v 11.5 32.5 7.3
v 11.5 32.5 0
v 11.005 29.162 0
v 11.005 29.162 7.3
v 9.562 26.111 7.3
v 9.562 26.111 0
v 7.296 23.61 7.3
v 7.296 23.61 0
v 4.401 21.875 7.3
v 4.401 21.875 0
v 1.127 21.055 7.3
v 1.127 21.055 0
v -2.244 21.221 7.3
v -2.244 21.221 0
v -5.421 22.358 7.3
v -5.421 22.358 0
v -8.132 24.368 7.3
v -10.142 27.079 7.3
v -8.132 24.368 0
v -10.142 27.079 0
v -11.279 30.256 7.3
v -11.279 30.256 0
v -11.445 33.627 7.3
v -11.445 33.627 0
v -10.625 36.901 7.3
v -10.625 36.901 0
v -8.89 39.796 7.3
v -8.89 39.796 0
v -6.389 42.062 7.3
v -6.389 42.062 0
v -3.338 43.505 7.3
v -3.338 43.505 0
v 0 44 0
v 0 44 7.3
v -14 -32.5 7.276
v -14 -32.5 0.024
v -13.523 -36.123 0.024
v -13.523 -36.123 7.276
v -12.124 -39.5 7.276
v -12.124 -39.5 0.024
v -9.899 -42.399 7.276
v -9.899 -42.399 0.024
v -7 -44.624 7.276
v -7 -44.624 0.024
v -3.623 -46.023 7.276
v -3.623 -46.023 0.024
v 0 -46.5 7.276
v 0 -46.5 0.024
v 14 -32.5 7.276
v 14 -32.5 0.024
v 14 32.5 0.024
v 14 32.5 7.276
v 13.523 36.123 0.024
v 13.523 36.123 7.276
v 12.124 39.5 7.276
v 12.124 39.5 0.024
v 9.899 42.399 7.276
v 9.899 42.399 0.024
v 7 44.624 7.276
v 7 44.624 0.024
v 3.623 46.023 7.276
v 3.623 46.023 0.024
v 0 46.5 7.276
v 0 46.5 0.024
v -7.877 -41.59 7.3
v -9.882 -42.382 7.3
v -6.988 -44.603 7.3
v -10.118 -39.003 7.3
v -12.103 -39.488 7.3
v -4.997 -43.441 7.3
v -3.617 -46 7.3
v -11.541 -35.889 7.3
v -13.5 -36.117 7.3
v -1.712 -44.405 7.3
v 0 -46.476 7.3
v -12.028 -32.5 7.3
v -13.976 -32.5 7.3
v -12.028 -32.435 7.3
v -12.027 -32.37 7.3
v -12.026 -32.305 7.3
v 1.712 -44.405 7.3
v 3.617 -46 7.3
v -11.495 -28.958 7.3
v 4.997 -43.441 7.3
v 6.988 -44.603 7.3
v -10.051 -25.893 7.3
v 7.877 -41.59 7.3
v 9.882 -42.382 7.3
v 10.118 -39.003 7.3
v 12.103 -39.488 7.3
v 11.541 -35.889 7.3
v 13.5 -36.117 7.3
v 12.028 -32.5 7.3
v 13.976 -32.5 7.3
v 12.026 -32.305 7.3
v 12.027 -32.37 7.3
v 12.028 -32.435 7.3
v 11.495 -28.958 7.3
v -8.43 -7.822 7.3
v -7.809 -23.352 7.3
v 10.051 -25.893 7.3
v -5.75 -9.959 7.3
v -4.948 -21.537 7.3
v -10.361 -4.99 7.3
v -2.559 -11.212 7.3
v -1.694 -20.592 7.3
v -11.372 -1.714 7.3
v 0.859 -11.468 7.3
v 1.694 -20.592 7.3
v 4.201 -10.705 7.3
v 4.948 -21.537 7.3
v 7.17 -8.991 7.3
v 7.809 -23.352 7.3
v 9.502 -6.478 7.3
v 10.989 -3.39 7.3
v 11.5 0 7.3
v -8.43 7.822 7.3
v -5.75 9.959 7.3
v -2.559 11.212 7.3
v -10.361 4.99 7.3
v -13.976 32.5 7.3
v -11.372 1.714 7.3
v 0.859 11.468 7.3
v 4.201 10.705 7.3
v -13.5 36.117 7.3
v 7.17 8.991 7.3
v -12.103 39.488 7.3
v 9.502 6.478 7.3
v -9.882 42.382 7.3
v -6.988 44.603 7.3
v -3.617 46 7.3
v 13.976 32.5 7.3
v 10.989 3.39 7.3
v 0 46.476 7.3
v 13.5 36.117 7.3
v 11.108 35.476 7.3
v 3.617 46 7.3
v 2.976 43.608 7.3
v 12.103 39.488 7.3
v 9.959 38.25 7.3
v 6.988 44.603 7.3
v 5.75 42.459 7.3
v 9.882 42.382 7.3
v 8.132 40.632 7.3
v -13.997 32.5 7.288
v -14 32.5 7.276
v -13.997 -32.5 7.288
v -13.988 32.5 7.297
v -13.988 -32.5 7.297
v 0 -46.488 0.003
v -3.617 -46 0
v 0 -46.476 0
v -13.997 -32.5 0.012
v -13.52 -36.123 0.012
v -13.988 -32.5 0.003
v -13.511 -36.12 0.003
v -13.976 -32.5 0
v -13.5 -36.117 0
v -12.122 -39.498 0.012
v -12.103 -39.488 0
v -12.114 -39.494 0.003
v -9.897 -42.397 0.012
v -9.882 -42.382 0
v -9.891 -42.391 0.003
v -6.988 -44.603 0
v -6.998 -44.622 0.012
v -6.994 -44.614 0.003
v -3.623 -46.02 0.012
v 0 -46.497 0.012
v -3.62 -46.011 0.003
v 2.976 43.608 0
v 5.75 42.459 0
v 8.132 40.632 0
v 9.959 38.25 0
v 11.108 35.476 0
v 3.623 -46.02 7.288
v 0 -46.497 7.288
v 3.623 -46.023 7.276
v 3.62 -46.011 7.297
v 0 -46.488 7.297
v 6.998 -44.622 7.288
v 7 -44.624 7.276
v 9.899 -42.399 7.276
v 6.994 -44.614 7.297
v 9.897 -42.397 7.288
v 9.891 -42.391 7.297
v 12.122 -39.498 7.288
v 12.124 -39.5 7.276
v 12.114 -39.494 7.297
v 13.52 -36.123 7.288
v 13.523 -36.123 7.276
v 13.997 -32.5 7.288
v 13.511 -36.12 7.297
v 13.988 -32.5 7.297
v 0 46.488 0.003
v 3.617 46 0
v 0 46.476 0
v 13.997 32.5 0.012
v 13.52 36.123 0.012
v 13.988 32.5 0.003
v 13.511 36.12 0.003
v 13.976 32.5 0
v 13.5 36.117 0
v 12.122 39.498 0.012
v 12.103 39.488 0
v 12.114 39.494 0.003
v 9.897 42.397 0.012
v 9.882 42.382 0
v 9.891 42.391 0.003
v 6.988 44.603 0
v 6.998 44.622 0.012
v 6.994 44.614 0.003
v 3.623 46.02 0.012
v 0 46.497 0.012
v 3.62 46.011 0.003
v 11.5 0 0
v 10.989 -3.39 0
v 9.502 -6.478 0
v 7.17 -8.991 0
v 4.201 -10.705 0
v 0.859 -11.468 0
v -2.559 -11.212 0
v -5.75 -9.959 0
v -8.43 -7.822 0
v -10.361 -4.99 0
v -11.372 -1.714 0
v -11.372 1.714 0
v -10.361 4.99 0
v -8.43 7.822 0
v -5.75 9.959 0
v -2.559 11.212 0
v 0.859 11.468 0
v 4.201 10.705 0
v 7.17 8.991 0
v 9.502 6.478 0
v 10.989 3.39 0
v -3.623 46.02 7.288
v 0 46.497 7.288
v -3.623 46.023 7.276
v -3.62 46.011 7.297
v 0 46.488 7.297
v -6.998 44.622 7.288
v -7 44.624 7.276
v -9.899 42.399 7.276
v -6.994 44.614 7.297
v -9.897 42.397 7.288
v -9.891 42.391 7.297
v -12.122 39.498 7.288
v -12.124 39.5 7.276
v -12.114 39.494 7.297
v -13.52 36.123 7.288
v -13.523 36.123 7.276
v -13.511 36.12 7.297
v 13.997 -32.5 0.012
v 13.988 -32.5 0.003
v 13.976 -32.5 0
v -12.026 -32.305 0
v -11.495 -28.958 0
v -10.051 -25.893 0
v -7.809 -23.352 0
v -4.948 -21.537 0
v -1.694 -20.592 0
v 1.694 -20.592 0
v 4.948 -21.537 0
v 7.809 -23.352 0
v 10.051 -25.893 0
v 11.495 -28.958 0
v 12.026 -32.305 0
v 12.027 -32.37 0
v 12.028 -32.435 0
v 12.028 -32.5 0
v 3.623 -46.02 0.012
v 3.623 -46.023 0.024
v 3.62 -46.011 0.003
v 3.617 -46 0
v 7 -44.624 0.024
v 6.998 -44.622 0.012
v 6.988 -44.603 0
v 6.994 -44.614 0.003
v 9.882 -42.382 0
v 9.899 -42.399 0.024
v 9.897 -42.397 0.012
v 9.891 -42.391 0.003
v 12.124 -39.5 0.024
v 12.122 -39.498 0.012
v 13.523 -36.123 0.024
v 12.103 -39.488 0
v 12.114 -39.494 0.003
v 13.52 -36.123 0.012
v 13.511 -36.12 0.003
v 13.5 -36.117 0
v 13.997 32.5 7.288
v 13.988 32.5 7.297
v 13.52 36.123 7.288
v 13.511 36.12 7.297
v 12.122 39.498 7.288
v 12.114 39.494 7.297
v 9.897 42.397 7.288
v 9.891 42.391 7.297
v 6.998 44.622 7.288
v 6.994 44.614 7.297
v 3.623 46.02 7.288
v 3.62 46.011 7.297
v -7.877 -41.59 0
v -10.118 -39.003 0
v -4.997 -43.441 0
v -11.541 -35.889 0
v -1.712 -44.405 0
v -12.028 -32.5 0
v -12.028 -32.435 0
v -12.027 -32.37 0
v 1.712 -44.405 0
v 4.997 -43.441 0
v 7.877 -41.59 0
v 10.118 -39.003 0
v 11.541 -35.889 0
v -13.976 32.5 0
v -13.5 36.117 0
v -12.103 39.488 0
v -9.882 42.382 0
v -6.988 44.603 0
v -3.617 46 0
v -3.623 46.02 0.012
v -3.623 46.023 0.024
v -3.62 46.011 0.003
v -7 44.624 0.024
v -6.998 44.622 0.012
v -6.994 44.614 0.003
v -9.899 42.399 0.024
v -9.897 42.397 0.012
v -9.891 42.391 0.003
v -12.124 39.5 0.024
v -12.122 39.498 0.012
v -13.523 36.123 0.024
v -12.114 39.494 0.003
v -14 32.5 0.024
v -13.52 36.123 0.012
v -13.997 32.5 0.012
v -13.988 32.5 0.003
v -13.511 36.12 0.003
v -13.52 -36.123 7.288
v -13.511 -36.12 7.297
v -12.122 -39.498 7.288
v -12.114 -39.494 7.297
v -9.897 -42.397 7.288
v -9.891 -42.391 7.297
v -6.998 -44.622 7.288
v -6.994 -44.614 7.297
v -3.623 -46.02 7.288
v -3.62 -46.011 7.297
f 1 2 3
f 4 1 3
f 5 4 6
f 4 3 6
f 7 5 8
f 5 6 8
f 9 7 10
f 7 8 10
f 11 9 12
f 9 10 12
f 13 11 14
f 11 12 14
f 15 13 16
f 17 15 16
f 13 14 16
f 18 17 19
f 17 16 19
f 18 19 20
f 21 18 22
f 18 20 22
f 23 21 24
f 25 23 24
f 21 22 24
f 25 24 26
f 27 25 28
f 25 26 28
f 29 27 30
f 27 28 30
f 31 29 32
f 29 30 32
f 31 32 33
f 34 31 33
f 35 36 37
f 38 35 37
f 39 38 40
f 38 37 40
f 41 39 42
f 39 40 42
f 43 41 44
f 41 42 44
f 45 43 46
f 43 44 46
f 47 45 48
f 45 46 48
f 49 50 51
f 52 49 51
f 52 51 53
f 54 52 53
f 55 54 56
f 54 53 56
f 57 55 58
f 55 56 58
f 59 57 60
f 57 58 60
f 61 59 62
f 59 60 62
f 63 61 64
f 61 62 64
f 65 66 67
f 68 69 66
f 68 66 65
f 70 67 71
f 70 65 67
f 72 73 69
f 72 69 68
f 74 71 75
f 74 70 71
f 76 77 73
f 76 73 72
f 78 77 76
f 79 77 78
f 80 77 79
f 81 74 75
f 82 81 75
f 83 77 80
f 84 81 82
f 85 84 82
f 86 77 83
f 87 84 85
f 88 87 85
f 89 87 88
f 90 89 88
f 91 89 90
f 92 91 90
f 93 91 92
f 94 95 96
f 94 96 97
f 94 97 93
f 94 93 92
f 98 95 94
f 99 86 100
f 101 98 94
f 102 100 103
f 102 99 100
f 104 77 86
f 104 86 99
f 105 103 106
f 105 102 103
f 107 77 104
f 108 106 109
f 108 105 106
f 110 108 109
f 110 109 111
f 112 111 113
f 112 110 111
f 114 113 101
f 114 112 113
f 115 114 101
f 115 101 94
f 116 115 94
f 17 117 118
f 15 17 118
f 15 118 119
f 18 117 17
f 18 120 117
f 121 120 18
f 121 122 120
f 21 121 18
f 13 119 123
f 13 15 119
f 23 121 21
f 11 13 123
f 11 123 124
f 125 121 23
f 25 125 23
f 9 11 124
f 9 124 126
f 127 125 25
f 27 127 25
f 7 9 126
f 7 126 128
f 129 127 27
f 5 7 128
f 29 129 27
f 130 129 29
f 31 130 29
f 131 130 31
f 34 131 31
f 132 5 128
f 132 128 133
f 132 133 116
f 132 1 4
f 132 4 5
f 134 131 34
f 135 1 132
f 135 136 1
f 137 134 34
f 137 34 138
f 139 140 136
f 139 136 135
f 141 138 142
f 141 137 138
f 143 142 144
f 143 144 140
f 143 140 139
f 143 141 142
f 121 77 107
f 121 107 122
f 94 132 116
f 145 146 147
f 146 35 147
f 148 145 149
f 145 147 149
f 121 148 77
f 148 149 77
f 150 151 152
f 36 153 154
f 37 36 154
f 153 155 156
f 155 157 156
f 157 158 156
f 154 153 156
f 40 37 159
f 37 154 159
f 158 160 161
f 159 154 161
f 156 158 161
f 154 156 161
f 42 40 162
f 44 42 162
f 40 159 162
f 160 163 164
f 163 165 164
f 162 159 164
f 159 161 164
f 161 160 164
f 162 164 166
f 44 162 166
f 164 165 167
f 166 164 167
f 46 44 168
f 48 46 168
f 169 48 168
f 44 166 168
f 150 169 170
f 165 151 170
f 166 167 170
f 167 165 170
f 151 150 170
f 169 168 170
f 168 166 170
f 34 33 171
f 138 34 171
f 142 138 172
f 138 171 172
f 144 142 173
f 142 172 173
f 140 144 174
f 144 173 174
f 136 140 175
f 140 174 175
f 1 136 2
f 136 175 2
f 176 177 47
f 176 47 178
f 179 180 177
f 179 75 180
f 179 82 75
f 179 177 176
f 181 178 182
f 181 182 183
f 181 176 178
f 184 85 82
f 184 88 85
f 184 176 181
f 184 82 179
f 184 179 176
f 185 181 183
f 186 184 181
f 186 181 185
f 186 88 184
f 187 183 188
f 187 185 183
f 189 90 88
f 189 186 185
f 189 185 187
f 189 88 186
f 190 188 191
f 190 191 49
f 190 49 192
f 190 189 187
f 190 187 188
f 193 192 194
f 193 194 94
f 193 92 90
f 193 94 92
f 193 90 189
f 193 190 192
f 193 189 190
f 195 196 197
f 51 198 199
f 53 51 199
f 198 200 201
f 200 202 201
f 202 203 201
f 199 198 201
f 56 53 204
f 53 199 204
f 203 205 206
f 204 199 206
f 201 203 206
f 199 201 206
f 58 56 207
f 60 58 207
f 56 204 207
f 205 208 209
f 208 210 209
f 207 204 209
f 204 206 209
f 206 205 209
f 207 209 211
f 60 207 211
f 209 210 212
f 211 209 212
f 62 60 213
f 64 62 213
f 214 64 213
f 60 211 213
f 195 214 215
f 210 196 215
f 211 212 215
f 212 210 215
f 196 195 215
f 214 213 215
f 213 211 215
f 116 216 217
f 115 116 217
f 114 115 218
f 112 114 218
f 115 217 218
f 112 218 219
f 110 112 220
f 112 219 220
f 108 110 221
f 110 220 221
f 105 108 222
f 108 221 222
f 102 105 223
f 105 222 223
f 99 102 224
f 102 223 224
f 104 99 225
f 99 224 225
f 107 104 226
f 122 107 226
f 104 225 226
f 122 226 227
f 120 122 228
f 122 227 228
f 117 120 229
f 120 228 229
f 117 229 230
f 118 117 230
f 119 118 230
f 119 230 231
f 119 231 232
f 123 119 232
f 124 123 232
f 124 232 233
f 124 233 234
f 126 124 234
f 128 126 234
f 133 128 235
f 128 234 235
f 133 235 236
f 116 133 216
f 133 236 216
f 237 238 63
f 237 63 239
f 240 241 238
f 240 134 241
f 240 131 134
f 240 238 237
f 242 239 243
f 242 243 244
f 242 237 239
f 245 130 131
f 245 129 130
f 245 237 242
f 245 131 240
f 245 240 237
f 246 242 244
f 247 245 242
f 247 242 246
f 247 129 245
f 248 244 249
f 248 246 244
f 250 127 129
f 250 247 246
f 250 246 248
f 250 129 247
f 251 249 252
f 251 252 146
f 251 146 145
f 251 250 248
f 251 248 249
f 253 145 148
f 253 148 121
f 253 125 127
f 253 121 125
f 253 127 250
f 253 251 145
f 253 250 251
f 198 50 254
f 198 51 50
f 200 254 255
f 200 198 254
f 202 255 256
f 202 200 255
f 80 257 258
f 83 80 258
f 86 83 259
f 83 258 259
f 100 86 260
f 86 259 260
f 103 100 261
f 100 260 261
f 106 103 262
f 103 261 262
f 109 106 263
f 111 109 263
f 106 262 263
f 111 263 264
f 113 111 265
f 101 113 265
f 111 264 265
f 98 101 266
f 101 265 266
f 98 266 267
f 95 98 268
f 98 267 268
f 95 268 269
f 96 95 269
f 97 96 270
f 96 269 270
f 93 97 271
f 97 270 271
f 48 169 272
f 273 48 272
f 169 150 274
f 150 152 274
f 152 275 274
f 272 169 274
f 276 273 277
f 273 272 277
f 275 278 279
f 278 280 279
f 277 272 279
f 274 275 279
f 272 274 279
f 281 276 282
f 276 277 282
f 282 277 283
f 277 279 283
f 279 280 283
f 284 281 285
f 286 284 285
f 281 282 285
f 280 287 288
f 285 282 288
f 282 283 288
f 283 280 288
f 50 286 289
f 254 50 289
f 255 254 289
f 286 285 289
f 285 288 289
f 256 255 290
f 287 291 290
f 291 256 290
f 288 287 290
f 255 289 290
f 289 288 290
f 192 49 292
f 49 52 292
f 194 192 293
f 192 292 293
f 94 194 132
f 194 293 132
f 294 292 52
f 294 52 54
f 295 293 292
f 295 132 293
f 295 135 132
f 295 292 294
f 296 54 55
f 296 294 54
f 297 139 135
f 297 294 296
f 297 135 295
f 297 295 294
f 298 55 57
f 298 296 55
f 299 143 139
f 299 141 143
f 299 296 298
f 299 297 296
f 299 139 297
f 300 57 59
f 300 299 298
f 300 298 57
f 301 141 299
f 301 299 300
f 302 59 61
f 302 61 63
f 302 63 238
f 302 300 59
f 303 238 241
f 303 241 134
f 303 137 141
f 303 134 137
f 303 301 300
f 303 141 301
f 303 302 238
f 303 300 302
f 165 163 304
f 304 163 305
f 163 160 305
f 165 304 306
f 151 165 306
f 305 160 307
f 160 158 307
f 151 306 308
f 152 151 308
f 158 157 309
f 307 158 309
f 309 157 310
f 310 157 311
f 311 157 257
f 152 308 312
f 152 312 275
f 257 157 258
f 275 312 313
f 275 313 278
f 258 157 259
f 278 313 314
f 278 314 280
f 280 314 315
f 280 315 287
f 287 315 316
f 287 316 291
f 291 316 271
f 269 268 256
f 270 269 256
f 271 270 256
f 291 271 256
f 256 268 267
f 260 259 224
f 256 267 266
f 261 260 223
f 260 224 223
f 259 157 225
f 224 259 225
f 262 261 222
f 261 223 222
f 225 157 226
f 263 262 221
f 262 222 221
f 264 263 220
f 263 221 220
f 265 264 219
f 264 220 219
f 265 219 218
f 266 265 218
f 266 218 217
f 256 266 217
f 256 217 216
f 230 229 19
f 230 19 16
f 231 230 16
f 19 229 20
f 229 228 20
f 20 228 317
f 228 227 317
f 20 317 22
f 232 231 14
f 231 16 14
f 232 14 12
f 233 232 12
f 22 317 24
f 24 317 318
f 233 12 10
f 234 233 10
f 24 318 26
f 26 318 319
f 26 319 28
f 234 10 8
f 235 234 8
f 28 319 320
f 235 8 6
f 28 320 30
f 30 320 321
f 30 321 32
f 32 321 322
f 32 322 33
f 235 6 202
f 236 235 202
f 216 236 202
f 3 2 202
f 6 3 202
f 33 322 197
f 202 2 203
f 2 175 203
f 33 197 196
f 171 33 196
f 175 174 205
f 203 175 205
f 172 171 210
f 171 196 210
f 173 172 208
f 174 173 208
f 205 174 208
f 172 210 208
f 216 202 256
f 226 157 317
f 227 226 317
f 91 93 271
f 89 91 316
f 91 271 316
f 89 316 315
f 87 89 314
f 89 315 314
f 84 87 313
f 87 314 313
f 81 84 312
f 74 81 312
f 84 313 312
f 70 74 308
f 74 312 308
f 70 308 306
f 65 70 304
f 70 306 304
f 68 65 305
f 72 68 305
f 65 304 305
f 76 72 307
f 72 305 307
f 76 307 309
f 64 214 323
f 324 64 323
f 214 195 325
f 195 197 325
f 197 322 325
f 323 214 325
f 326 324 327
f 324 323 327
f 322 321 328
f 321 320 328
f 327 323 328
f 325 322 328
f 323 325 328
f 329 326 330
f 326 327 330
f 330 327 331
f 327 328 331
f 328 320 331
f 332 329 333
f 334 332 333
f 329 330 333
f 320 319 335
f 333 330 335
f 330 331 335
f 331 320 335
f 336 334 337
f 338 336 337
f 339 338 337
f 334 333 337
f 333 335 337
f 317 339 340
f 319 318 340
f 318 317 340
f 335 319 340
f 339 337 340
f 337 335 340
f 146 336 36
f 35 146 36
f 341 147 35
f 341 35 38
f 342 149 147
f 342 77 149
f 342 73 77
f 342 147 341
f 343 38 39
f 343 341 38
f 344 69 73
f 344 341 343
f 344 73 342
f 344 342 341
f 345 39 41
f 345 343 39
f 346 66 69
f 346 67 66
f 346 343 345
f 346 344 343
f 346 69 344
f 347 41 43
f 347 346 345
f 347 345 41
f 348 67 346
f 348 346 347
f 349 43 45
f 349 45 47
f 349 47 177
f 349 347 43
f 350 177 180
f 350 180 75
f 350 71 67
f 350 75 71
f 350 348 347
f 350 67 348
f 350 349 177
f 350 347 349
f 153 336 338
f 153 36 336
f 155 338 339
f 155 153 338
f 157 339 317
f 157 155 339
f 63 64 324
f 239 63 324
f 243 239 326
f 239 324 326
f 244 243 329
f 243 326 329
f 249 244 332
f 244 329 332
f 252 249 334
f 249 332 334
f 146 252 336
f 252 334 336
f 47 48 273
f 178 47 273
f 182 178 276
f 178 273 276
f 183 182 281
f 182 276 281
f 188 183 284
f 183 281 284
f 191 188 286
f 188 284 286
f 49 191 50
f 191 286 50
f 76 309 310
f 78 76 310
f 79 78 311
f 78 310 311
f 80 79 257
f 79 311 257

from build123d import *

# Parameters (mm, degrees)
F1_DEPTH = 7.3
F2_R     = 0.0241421356


with BuildPart() as f1:
    # F0 (on Top) → F1 (new body)
    with BuildSketch(Plane.XY):
        with BuildLine():
            ThreePointArc((14, 32.5), (9.8994949366, 42.3994949366), (0, 46.5))
            ThreePointArc((0, 46.5), (-9.8994949366, 42.3994949366), (-14, 32.5))
            Line((-14, 32.5), (-14, -32.5))
            Line((-14, -32.5), (-12.0277635282, -32.5))
            ThreePointArc((-12.0277635282, -32.5), (-12.0273670809, -32.4023445279), (-12.0261777652, -32.3046954935))
            ThreePointArc((-12.0261777652, -32.3046954935), (0, -20.4722364718), (12.0261777652, -32.3046954935))
            ThreePointArc((12.0261777652, -32.3046954935), (12.0273670809, -32.4023445279), (12.0277635282, -32.5))
            ThreePointArc((12.0277635282, -32.5), (8.5049131533, -41.0049131533), (0, -44.5277635282))
            Line((0, -44.5277635282), (0, -46.5))
            ThreePointArc((0, -46.5), (9.8994949366, -42.3994949366), (14, -32.5))
            Line((14, -32.5), (14, 32.5))
        make_face()
        with BuildLine():
            ThreePointArc((-11.5, 0), (0, 11.5), (11.5, 0))
            ThreePointArc((11.5, 0), (0, -11.5), (-11.5, 0))
        make_face(mode=Mode.SUBTRACT)
        with BuildLine():
            ThreePointArc((11.5, 32.5), (-8.1317279836, 24.3682720164), (0, 44))
            ThreePointArc((0, 44), (8.1317279836, 40.6317279836), (11.5, 32.5))
        make_face(mode=Mode.SUBTRACT)
        with BuildLine():
            Line((-12.0277635282, -32.5), (-14, -32.5))
            ThreePointArc((-14, -32.5), (-9.8994949366, -42.3994949366), (0, -46.5))
            Line((0, -46.5), (0, -44.5277635282))
            ThreePointArc((0, -44.5277635282), (-8.5049131533, -41.0049131533), (-12.0277635282, -32.5))
        make_face()
    extrude(amount=F1_DEPTH)

    # F2
    f2_edges = [f1.edges().sort_by_distance(p)[0] for p in [
        (0, 46.5, 7.3),
        (-14, 0, 7.3),
        (0, -46.5, 7.3),
        (14, 0, 7.3),
        (0, 46.5, 0),
        (14, 0, 0),
        (-14, 0, 0),
        (0, -46.5, 0),
    ]]
    fillet(f2_edges, radius=F2_R)


solid = f1.part
